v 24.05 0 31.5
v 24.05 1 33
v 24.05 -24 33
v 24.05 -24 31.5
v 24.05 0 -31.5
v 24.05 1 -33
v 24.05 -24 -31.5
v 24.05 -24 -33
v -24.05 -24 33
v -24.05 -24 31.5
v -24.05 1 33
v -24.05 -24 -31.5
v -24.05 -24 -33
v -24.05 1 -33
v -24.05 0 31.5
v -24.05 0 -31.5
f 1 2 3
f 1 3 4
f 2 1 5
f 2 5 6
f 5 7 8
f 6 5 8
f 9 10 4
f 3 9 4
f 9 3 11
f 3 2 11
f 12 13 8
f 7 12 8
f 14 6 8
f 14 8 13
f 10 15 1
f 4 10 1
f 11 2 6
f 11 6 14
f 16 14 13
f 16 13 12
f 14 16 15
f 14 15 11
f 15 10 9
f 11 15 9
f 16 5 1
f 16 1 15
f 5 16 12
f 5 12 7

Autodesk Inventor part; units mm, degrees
ref_plane "YZ Plane" through (0, 0, 0) normal (1, 0, 0) x (0, 1, 0)
ref_plane "XZ Plane" through (0, 0, 0) normal (0, 1, 0) x (-1, 0, 0)
ref_plane "XY Plane" through (0, 0, 0) normal (0, 0, 1) x (1, 0, 0)
sketch "Sketch1" plane through (0, 0, 0) normal (0, 1, 0) x (-1, 0, 0)
  line L0 (-24.05, -31.5) -> (24.05, -31.5)
  line L1 (24.05, -31.5) -> (24.05, 31.5)
  line L2 (24.05, 31.5) -> (-24.05, 31.5)
  line L3 (-24.05, 31.5) -> (-24.05, -31.5)
  line L4 (-24.05, -31.5) -> (24.05, 31.5) construction
  line L5 (24.05, -31.5) -> (-24.05, 31.5) construction
  point P0 (0, 0)
  dimension "d0" = 63
  dimension "d1" = 48.1
extrude "Extrusion1" add sketch "Sketch1" along normal blind 1
sketch "Sketch2" plane through (0, 1, 0) normal (0, 1, 0) x (1, 0, 0)
  line L0 (-24.05, -31.5) -> (24.05, -31.5) projected
  line L1 (-24.05, -31.5) -> (24.05, -31.5)
  line L2 (24.05, -31.5) -> (24.05, -33)
  line L3 (24.05, -33) -> (-24.05, -33)
  line L4 (-24.05, -33) -> (-24.05, -31.5)
  line L5 (-24.05, 31.5) -> (24.05, 31.5)
  line L6 (24.05, 31.5) -> (24.05, 33)
  line L7 (24.05, 33) -> (-24.05, 33)
  line L8 (-24.05, 33) -> (-24.05, 31.5)
  point P0 (0, 0)
  point P1 (20.95, -31.5)
  dimension "d4" = 1.5
extrude "Extrusion2" add sketch "Sketch2" against normal blind 25
properties part number "Module Cover"
